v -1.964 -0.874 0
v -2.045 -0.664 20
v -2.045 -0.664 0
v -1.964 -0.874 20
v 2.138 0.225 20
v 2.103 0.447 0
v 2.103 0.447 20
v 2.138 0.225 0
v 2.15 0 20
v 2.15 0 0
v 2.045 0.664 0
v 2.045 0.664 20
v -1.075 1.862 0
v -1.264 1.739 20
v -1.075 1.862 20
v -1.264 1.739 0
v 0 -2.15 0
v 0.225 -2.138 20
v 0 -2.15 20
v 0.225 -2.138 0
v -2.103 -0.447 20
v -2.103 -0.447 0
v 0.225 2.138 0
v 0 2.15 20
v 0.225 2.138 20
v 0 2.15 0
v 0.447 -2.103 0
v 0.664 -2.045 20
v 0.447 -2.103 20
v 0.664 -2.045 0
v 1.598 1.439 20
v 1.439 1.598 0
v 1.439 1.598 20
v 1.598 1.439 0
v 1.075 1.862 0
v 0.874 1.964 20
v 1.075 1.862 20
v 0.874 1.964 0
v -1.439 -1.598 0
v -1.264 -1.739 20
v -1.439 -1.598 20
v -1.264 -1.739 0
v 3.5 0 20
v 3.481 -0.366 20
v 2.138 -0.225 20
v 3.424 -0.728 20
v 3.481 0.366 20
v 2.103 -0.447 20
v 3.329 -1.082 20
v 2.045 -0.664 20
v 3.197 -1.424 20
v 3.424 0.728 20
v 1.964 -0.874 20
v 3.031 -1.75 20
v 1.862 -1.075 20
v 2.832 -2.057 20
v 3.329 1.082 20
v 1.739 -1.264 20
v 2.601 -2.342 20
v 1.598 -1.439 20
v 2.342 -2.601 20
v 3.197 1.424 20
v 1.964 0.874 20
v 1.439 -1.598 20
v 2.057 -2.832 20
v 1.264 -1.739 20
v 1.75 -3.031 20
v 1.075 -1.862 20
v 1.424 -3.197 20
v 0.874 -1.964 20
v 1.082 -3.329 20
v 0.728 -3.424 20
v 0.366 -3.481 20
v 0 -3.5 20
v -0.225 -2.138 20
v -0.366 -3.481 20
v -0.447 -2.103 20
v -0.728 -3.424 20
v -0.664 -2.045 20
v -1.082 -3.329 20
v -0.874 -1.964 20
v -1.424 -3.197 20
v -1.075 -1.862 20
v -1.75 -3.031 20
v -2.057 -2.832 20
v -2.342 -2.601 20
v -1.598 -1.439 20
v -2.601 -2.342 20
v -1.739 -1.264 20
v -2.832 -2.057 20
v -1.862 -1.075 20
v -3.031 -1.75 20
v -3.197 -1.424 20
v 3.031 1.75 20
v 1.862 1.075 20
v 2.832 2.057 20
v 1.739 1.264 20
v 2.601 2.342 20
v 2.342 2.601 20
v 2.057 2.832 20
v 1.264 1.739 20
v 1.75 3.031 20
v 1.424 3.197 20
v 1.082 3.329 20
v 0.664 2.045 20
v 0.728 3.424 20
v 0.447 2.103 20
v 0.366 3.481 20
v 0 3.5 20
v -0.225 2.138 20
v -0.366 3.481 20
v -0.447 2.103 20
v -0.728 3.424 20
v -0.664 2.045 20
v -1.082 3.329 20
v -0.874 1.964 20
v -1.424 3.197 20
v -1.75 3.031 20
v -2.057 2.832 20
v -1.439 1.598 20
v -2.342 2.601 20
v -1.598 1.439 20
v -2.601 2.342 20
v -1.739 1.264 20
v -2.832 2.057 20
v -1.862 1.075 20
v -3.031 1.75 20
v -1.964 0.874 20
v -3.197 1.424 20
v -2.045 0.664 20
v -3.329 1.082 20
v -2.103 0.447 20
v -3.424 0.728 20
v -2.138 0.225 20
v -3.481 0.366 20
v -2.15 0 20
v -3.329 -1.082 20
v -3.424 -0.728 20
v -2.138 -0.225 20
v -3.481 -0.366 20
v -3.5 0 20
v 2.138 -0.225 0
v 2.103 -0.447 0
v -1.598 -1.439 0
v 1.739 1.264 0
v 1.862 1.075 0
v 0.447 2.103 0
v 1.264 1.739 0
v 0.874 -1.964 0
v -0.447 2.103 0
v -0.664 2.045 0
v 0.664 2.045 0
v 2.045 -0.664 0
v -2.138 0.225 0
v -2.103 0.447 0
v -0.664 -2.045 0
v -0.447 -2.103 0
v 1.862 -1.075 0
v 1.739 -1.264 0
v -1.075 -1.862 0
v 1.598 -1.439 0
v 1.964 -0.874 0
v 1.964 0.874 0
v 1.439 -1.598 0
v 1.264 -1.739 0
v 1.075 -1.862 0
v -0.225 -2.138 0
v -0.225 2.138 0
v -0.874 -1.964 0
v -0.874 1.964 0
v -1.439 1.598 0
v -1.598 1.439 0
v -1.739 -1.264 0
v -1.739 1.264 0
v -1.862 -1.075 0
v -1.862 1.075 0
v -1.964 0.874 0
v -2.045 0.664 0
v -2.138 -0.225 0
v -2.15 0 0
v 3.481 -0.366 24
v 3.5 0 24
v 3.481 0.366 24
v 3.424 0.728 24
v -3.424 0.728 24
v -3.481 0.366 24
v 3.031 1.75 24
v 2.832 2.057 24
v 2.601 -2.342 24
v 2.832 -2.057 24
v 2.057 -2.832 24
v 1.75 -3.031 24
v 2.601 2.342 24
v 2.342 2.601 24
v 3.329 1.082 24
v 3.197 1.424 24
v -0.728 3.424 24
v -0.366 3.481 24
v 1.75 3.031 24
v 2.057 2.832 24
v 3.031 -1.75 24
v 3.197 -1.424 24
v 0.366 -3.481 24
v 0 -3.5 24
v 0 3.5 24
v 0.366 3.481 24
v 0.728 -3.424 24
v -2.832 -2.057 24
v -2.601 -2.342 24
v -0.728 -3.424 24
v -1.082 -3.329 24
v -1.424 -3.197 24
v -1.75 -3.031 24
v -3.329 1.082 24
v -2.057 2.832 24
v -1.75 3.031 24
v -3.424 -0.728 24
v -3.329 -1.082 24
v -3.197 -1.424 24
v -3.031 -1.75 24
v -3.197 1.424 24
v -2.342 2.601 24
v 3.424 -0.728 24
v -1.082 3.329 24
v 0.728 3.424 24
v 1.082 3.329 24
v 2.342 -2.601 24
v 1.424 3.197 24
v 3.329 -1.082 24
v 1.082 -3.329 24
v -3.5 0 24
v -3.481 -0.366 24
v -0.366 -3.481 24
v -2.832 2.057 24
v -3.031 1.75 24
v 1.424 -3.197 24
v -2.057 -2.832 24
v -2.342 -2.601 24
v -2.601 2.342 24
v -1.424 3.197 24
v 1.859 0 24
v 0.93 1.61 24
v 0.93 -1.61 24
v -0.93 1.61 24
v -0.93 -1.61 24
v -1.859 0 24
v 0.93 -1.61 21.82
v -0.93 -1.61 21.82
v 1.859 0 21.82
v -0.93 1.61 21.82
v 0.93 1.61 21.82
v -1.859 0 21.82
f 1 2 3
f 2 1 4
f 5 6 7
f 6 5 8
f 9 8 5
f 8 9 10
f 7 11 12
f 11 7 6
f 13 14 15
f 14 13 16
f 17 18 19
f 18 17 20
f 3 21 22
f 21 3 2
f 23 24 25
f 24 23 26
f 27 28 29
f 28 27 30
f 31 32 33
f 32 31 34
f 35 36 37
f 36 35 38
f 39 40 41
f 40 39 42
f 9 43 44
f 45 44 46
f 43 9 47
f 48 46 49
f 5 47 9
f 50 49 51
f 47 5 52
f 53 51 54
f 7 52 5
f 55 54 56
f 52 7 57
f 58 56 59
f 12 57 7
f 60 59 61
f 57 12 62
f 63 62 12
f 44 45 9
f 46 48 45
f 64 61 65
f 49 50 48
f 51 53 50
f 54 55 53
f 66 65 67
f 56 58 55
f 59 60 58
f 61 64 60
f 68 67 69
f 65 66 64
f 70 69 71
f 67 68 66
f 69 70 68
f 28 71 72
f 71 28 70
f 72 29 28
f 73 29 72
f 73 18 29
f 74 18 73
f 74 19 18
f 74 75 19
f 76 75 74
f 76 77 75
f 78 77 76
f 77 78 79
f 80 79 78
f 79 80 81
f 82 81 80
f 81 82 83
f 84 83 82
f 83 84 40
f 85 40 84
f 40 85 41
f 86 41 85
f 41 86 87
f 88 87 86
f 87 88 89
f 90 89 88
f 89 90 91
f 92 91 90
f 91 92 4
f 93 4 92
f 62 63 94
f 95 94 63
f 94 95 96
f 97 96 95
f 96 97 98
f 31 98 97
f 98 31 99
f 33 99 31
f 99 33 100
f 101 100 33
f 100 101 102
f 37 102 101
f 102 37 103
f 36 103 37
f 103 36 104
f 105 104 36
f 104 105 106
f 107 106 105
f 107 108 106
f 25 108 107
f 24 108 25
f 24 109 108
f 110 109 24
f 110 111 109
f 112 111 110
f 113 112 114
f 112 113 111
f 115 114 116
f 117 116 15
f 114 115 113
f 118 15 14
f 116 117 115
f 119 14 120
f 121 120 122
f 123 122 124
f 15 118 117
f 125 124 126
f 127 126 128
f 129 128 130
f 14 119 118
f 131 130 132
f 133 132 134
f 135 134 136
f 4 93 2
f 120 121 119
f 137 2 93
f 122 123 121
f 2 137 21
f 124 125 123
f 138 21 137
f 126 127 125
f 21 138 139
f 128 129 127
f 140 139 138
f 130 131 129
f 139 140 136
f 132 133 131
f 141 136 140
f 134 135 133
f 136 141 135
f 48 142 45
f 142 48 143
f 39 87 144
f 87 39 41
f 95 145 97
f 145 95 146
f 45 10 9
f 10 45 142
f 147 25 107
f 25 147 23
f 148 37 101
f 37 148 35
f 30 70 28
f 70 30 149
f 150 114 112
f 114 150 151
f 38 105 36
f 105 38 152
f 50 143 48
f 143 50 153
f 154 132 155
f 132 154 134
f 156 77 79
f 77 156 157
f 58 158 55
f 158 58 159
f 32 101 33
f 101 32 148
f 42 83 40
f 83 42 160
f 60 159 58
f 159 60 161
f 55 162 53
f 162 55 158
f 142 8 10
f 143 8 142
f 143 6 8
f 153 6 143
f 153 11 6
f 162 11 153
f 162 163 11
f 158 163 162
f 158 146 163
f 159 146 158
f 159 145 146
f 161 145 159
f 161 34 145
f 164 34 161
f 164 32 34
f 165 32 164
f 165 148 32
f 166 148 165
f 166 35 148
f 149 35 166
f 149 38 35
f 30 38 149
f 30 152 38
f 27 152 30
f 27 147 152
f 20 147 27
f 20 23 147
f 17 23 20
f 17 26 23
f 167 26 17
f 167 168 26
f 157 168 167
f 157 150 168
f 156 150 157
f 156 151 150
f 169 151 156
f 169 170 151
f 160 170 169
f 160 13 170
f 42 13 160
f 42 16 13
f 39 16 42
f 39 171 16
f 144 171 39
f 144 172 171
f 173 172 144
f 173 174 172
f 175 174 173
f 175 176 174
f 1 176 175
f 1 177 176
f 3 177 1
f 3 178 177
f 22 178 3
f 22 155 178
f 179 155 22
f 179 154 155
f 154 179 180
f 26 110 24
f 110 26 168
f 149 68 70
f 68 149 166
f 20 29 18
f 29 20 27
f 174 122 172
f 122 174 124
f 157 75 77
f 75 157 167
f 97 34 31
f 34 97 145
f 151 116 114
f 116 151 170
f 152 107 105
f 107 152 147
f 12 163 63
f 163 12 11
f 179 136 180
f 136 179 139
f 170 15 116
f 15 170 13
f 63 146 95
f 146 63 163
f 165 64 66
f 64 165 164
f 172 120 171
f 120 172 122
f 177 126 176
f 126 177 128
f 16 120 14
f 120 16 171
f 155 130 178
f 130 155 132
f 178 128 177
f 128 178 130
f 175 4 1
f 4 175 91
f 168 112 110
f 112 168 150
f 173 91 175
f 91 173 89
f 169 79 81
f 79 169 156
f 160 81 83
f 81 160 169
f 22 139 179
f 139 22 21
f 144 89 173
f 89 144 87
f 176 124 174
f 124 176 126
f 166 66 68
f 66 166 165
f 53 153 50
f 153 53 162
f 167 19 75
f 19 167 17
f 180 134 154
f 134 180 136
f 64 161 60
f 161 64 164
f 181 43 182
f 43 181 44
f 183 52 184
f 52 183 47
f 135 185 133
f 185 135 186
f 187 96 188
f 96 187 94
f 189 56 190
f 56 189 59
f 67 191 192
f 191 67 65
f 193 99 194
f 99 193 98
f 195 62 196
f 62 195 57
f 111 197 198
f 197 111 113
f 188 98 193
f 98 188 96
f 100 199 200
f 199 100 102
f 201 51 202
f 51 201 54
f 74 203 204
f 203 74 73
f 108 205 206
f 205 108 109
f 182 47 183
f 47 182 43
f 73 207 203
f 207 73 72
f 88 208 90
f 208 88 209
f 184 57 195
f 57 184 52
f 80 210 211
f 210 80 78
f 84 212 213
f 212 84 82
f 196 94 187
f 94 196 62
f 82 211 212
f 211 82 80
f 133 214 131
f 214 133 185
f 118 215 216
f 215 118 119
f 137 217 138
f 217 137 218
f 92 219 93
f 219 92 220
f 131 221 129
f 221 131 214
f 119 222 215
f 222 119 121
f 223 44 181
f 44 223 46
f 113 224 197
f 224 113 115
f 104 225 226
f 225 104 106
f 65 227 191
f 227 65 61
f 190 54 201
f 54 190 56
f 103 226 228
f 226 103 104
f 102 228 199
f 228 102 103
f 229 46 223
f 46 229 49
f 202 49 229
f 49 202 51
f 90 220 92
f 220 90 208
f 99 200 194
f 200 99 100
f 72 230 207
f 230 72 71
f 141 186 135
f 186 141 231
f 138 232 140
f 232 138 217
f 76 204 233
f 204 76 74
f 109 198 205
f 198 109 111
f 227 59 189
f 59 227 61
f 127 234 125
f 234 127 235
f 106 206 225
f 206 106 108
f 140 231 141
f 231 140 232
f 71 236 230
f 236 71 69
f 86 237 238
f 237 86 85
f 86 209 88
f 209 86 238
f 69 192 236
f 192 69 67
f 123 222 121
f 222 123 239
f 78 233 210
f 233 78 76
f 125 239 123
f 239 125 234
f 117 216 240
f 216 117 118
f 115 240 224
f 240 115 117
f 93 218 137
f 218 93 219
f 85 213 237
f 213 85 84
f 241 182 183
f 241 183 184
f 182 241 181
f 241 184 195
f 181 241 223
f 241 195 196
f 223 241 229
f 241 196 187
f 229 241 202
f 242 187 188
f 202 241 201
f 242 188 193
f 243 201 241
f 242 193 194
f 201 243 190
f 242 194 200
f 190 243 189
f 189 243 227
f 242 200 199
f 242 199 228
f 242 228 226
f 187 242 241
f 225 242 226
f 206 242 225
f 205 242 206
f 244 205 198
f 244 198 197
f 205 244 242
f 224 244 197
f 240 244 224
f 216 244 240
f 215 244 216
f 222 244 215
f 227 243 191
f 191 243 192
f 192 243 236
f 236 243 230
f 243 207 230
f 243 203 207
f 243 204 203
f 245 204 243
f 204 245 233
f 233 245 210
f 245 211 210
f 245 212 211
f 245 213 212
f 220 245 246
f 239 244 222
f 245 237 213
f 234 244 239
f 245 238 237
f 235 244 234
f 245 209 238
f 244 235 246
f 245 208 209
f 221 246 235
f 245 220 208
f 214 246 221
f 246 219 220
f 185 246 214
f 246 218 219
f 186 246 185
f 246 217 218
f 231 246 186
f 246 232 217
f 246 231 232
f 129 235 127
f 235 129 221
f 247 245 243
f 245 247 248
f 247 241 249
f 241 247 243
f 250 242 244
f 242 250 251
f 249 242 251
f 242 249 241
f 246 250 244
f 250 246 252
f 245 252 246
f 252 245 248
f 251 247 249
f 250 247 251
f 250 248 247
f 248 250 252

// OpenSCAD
// Socket-head cap screw, smooth printable representation.
$fn = 60;
eps = 0.02;
shaft_d = 4.3;
head_d = 7;
head_h = 4;
shaft_l = 20;
socket_flat = head_d * 0.46;
socket_depth = head_h * 0.55;
difference() {
    union() {
        cylinder(d = shaft_d, h = shaft_l);
        translate([0, 0, shaft_l]) cylinder(d = head_d, h = head_h);
    }
    translate([0, 0, shaft_l + head_h - socket_depth + eps])
        cylinder(d = socket_flat / cos(30), h = socket_depth + eps, $fn = 6);
}
